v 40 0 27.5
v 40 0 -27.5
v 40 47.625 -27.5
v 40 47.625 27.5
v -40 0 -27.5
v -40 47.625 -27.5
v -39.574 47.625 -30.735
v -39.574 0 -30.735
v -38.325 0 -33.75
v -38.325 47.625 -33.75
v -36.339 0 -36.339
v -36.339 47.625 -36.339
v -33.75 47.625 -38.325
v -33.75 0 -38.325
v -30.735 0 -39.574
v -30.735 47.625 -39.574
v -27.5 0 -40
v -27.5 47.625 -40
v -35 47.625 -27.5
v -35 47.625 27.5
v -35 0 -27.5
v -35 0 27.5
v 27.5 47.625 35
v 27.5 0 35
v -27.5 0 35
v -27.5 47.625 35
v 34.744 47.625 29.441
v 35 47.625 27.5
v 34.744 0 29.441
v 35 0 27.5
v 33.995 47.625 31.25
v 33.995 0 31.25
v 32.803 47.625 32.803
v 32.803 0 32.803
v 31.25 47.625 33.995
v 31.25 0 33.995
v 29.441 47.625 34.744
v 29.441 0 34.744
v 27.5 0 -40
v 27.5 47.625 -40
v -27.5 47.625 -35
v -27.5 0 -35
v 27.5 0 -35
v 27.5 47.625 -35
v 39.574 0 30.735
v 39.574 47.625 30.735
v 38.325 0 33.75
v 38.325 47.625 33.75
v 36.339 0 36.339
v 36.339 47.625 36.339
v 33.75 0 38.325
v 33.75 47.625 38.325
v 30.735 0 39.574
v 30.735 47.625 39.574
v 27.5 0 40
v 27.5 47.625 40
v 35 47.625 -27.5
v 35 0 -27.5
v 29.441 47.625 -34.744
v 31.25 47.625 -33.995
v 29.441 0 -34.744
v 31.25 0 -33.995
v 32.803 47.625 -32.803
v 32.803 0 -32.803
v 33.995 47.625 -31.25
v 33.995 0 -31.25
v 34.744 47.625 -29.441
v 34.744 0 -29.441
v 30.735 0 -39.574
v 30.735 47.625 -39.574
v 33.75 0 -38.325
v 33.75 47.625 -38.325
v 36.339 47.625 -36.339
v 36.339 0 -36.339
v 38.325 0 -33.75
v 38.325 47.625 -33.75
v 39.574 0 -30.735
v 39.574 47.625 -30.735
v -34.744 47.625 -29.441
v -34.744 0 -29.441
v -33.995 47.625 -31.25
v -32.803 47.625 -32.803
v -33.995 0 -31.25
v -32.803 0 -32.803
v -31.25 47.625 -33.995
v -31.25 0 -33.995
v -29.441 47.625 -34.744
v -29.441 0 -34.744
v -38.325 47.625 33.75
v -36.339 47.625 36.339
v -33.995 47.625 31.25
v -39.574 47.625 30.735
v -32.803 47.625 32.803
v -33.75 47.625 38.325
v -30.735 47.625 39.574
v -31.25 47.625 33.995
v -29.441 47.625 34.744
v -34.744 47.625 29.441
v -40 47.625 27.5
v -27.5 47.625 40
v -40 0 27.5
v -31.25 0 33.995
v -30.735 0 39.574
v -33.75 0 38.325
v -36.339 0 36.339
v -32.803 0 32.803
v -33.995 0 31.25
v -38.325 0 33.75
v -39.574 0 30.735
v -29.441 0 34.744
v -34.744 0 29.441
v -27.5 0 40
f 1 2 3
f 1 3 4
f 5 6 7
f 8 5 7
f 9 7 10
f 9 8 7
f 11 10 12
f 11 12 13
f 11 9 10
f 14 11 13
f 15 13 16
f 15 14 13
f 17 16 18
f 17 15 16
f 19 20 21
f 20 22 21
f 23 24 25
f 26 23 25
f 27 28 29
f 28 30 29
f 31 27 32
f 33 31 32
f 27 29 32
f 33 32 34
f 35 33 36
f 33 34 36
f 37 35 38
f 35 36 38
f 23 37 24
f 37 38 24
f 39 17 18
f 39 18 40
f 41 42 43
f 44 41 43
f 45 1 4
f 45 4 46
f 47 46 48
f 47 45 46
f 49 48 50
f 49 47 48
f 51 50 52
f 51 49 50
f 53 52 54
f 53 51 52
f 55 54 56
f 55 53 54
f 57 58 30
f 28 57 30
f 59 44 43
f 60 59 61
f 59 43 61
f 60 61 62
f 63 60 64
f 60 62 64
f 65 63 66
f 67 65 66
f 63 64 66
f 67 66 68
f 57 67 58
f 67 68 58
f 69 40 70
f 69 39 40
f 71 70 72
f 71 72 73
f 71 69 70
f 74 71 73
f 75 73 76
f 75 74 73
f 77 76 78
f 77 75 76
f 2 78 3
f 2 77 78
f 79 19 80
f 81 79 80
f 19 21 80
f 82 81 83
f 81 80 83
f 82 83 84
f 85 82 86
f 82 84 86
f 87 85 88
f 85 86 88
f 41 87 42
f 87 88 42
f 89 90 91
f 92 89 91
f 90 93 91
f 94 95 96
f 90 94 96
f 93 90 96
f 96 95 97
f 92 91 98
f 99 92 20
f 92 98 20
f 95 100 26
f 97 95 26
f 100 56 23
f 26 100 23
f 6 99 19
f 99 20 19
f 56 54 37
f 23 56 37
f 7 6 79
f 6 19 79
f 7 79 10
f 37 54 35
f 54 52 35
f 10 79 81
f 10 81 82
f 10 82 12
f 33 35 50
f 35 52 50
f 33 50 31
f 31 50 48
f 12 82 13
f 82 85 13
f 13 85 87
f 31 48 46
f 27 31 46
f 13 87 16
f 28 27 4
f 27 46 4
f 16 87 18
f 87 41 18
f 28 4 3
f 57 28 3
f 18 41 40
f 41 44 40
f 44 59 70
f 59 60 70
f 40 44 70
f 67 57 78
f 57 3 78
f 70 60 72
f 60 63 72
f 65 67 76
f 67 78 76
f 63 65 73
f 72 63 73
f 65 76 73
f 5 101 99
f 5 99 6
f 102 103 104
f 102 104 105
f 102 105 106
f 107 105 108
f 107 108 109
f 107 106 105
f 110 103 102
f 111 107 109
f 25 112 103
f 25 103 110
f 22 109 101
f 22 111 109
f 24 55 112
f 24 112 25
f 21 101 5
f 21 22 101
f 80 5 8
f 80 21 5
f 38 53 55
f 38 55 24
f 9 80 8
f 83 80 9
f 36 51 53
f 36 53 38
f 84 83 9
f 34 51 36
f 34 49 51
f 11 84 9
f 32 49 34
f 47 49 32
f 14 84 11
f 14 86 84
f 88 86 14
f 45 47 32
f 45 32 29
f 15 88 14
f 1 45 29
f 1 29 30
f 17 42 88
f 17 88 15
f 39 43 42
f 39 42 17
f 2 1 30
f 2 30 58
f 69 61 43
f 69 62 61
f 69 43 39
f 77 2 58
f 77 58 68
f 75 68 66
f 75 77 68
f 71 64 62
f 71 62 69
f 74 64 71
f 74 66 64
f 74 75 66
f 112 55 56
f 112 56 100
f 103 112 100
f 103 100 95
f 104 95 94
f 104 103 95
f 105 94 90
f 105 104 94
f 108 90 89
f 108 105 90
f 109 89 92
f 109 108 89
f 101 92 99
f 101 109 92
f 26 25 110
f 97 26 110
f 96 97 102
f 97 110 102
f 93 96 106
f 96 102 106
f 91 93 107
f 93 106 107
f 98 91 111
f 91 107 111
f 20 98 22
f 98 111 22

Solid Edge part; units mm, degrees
sketch "Sketch1" plane through (0, 0, 0) normal (0, -1, 0) x (1, 0, 0)
  arc A0 (-27.5, 35) -> (-35, 27.5) centre (-27.5, 27.5) ccw
  line L0 (-35, 27.5) -> (-35, -27.5)
  arc A1 (-35, -27.5) -> (-27.5, -35) centre (-27.5, -27.5) ccw
  line L1 (-27.5, -35) -> (27.5, -35)
  arc A2 (27.5, -35) -> (35, -27.5) centre (27.5, -27.5) ccw
  line L2 (35, -27.5) -> (35, 27.5)
  arc A3 (35, 27.5) -> (27.5, 35) centre (27.5, 27.5) ccw
  line L3 (27.5, 35) -> (-27.5, 35)
  arc A4 (-27.5, 40) -> (-40, 27.5) centre (-27.5, 27.5) ccw
  line L4 (-40, 27.5) -> (-40, -27.5)
  arc A5 (-40, -27.5) -> (-27.5, -40) centre (-27.5, -27.5) ccw
  line L5 (-27.5, -40) -> (27.5, -40)
  arc A6 (27.5, -40) -> (40, -27.5) centre (27.5, -27.5) ccw
  line L6 (40, -27.5) -> (40, 27.5)
  arc A7 (40, 27.5) -> (27.5, 40) centre (27.5, 27.5) ccw
  line L7 (27.5, 40) -> (-27.5, 40)
  dimension "D1" = 80
  dimension "D2" = 80
  dimension "D3" = 5
extrude "Protrusion1" add sketch "Sketch1" against normal blind 47.625
